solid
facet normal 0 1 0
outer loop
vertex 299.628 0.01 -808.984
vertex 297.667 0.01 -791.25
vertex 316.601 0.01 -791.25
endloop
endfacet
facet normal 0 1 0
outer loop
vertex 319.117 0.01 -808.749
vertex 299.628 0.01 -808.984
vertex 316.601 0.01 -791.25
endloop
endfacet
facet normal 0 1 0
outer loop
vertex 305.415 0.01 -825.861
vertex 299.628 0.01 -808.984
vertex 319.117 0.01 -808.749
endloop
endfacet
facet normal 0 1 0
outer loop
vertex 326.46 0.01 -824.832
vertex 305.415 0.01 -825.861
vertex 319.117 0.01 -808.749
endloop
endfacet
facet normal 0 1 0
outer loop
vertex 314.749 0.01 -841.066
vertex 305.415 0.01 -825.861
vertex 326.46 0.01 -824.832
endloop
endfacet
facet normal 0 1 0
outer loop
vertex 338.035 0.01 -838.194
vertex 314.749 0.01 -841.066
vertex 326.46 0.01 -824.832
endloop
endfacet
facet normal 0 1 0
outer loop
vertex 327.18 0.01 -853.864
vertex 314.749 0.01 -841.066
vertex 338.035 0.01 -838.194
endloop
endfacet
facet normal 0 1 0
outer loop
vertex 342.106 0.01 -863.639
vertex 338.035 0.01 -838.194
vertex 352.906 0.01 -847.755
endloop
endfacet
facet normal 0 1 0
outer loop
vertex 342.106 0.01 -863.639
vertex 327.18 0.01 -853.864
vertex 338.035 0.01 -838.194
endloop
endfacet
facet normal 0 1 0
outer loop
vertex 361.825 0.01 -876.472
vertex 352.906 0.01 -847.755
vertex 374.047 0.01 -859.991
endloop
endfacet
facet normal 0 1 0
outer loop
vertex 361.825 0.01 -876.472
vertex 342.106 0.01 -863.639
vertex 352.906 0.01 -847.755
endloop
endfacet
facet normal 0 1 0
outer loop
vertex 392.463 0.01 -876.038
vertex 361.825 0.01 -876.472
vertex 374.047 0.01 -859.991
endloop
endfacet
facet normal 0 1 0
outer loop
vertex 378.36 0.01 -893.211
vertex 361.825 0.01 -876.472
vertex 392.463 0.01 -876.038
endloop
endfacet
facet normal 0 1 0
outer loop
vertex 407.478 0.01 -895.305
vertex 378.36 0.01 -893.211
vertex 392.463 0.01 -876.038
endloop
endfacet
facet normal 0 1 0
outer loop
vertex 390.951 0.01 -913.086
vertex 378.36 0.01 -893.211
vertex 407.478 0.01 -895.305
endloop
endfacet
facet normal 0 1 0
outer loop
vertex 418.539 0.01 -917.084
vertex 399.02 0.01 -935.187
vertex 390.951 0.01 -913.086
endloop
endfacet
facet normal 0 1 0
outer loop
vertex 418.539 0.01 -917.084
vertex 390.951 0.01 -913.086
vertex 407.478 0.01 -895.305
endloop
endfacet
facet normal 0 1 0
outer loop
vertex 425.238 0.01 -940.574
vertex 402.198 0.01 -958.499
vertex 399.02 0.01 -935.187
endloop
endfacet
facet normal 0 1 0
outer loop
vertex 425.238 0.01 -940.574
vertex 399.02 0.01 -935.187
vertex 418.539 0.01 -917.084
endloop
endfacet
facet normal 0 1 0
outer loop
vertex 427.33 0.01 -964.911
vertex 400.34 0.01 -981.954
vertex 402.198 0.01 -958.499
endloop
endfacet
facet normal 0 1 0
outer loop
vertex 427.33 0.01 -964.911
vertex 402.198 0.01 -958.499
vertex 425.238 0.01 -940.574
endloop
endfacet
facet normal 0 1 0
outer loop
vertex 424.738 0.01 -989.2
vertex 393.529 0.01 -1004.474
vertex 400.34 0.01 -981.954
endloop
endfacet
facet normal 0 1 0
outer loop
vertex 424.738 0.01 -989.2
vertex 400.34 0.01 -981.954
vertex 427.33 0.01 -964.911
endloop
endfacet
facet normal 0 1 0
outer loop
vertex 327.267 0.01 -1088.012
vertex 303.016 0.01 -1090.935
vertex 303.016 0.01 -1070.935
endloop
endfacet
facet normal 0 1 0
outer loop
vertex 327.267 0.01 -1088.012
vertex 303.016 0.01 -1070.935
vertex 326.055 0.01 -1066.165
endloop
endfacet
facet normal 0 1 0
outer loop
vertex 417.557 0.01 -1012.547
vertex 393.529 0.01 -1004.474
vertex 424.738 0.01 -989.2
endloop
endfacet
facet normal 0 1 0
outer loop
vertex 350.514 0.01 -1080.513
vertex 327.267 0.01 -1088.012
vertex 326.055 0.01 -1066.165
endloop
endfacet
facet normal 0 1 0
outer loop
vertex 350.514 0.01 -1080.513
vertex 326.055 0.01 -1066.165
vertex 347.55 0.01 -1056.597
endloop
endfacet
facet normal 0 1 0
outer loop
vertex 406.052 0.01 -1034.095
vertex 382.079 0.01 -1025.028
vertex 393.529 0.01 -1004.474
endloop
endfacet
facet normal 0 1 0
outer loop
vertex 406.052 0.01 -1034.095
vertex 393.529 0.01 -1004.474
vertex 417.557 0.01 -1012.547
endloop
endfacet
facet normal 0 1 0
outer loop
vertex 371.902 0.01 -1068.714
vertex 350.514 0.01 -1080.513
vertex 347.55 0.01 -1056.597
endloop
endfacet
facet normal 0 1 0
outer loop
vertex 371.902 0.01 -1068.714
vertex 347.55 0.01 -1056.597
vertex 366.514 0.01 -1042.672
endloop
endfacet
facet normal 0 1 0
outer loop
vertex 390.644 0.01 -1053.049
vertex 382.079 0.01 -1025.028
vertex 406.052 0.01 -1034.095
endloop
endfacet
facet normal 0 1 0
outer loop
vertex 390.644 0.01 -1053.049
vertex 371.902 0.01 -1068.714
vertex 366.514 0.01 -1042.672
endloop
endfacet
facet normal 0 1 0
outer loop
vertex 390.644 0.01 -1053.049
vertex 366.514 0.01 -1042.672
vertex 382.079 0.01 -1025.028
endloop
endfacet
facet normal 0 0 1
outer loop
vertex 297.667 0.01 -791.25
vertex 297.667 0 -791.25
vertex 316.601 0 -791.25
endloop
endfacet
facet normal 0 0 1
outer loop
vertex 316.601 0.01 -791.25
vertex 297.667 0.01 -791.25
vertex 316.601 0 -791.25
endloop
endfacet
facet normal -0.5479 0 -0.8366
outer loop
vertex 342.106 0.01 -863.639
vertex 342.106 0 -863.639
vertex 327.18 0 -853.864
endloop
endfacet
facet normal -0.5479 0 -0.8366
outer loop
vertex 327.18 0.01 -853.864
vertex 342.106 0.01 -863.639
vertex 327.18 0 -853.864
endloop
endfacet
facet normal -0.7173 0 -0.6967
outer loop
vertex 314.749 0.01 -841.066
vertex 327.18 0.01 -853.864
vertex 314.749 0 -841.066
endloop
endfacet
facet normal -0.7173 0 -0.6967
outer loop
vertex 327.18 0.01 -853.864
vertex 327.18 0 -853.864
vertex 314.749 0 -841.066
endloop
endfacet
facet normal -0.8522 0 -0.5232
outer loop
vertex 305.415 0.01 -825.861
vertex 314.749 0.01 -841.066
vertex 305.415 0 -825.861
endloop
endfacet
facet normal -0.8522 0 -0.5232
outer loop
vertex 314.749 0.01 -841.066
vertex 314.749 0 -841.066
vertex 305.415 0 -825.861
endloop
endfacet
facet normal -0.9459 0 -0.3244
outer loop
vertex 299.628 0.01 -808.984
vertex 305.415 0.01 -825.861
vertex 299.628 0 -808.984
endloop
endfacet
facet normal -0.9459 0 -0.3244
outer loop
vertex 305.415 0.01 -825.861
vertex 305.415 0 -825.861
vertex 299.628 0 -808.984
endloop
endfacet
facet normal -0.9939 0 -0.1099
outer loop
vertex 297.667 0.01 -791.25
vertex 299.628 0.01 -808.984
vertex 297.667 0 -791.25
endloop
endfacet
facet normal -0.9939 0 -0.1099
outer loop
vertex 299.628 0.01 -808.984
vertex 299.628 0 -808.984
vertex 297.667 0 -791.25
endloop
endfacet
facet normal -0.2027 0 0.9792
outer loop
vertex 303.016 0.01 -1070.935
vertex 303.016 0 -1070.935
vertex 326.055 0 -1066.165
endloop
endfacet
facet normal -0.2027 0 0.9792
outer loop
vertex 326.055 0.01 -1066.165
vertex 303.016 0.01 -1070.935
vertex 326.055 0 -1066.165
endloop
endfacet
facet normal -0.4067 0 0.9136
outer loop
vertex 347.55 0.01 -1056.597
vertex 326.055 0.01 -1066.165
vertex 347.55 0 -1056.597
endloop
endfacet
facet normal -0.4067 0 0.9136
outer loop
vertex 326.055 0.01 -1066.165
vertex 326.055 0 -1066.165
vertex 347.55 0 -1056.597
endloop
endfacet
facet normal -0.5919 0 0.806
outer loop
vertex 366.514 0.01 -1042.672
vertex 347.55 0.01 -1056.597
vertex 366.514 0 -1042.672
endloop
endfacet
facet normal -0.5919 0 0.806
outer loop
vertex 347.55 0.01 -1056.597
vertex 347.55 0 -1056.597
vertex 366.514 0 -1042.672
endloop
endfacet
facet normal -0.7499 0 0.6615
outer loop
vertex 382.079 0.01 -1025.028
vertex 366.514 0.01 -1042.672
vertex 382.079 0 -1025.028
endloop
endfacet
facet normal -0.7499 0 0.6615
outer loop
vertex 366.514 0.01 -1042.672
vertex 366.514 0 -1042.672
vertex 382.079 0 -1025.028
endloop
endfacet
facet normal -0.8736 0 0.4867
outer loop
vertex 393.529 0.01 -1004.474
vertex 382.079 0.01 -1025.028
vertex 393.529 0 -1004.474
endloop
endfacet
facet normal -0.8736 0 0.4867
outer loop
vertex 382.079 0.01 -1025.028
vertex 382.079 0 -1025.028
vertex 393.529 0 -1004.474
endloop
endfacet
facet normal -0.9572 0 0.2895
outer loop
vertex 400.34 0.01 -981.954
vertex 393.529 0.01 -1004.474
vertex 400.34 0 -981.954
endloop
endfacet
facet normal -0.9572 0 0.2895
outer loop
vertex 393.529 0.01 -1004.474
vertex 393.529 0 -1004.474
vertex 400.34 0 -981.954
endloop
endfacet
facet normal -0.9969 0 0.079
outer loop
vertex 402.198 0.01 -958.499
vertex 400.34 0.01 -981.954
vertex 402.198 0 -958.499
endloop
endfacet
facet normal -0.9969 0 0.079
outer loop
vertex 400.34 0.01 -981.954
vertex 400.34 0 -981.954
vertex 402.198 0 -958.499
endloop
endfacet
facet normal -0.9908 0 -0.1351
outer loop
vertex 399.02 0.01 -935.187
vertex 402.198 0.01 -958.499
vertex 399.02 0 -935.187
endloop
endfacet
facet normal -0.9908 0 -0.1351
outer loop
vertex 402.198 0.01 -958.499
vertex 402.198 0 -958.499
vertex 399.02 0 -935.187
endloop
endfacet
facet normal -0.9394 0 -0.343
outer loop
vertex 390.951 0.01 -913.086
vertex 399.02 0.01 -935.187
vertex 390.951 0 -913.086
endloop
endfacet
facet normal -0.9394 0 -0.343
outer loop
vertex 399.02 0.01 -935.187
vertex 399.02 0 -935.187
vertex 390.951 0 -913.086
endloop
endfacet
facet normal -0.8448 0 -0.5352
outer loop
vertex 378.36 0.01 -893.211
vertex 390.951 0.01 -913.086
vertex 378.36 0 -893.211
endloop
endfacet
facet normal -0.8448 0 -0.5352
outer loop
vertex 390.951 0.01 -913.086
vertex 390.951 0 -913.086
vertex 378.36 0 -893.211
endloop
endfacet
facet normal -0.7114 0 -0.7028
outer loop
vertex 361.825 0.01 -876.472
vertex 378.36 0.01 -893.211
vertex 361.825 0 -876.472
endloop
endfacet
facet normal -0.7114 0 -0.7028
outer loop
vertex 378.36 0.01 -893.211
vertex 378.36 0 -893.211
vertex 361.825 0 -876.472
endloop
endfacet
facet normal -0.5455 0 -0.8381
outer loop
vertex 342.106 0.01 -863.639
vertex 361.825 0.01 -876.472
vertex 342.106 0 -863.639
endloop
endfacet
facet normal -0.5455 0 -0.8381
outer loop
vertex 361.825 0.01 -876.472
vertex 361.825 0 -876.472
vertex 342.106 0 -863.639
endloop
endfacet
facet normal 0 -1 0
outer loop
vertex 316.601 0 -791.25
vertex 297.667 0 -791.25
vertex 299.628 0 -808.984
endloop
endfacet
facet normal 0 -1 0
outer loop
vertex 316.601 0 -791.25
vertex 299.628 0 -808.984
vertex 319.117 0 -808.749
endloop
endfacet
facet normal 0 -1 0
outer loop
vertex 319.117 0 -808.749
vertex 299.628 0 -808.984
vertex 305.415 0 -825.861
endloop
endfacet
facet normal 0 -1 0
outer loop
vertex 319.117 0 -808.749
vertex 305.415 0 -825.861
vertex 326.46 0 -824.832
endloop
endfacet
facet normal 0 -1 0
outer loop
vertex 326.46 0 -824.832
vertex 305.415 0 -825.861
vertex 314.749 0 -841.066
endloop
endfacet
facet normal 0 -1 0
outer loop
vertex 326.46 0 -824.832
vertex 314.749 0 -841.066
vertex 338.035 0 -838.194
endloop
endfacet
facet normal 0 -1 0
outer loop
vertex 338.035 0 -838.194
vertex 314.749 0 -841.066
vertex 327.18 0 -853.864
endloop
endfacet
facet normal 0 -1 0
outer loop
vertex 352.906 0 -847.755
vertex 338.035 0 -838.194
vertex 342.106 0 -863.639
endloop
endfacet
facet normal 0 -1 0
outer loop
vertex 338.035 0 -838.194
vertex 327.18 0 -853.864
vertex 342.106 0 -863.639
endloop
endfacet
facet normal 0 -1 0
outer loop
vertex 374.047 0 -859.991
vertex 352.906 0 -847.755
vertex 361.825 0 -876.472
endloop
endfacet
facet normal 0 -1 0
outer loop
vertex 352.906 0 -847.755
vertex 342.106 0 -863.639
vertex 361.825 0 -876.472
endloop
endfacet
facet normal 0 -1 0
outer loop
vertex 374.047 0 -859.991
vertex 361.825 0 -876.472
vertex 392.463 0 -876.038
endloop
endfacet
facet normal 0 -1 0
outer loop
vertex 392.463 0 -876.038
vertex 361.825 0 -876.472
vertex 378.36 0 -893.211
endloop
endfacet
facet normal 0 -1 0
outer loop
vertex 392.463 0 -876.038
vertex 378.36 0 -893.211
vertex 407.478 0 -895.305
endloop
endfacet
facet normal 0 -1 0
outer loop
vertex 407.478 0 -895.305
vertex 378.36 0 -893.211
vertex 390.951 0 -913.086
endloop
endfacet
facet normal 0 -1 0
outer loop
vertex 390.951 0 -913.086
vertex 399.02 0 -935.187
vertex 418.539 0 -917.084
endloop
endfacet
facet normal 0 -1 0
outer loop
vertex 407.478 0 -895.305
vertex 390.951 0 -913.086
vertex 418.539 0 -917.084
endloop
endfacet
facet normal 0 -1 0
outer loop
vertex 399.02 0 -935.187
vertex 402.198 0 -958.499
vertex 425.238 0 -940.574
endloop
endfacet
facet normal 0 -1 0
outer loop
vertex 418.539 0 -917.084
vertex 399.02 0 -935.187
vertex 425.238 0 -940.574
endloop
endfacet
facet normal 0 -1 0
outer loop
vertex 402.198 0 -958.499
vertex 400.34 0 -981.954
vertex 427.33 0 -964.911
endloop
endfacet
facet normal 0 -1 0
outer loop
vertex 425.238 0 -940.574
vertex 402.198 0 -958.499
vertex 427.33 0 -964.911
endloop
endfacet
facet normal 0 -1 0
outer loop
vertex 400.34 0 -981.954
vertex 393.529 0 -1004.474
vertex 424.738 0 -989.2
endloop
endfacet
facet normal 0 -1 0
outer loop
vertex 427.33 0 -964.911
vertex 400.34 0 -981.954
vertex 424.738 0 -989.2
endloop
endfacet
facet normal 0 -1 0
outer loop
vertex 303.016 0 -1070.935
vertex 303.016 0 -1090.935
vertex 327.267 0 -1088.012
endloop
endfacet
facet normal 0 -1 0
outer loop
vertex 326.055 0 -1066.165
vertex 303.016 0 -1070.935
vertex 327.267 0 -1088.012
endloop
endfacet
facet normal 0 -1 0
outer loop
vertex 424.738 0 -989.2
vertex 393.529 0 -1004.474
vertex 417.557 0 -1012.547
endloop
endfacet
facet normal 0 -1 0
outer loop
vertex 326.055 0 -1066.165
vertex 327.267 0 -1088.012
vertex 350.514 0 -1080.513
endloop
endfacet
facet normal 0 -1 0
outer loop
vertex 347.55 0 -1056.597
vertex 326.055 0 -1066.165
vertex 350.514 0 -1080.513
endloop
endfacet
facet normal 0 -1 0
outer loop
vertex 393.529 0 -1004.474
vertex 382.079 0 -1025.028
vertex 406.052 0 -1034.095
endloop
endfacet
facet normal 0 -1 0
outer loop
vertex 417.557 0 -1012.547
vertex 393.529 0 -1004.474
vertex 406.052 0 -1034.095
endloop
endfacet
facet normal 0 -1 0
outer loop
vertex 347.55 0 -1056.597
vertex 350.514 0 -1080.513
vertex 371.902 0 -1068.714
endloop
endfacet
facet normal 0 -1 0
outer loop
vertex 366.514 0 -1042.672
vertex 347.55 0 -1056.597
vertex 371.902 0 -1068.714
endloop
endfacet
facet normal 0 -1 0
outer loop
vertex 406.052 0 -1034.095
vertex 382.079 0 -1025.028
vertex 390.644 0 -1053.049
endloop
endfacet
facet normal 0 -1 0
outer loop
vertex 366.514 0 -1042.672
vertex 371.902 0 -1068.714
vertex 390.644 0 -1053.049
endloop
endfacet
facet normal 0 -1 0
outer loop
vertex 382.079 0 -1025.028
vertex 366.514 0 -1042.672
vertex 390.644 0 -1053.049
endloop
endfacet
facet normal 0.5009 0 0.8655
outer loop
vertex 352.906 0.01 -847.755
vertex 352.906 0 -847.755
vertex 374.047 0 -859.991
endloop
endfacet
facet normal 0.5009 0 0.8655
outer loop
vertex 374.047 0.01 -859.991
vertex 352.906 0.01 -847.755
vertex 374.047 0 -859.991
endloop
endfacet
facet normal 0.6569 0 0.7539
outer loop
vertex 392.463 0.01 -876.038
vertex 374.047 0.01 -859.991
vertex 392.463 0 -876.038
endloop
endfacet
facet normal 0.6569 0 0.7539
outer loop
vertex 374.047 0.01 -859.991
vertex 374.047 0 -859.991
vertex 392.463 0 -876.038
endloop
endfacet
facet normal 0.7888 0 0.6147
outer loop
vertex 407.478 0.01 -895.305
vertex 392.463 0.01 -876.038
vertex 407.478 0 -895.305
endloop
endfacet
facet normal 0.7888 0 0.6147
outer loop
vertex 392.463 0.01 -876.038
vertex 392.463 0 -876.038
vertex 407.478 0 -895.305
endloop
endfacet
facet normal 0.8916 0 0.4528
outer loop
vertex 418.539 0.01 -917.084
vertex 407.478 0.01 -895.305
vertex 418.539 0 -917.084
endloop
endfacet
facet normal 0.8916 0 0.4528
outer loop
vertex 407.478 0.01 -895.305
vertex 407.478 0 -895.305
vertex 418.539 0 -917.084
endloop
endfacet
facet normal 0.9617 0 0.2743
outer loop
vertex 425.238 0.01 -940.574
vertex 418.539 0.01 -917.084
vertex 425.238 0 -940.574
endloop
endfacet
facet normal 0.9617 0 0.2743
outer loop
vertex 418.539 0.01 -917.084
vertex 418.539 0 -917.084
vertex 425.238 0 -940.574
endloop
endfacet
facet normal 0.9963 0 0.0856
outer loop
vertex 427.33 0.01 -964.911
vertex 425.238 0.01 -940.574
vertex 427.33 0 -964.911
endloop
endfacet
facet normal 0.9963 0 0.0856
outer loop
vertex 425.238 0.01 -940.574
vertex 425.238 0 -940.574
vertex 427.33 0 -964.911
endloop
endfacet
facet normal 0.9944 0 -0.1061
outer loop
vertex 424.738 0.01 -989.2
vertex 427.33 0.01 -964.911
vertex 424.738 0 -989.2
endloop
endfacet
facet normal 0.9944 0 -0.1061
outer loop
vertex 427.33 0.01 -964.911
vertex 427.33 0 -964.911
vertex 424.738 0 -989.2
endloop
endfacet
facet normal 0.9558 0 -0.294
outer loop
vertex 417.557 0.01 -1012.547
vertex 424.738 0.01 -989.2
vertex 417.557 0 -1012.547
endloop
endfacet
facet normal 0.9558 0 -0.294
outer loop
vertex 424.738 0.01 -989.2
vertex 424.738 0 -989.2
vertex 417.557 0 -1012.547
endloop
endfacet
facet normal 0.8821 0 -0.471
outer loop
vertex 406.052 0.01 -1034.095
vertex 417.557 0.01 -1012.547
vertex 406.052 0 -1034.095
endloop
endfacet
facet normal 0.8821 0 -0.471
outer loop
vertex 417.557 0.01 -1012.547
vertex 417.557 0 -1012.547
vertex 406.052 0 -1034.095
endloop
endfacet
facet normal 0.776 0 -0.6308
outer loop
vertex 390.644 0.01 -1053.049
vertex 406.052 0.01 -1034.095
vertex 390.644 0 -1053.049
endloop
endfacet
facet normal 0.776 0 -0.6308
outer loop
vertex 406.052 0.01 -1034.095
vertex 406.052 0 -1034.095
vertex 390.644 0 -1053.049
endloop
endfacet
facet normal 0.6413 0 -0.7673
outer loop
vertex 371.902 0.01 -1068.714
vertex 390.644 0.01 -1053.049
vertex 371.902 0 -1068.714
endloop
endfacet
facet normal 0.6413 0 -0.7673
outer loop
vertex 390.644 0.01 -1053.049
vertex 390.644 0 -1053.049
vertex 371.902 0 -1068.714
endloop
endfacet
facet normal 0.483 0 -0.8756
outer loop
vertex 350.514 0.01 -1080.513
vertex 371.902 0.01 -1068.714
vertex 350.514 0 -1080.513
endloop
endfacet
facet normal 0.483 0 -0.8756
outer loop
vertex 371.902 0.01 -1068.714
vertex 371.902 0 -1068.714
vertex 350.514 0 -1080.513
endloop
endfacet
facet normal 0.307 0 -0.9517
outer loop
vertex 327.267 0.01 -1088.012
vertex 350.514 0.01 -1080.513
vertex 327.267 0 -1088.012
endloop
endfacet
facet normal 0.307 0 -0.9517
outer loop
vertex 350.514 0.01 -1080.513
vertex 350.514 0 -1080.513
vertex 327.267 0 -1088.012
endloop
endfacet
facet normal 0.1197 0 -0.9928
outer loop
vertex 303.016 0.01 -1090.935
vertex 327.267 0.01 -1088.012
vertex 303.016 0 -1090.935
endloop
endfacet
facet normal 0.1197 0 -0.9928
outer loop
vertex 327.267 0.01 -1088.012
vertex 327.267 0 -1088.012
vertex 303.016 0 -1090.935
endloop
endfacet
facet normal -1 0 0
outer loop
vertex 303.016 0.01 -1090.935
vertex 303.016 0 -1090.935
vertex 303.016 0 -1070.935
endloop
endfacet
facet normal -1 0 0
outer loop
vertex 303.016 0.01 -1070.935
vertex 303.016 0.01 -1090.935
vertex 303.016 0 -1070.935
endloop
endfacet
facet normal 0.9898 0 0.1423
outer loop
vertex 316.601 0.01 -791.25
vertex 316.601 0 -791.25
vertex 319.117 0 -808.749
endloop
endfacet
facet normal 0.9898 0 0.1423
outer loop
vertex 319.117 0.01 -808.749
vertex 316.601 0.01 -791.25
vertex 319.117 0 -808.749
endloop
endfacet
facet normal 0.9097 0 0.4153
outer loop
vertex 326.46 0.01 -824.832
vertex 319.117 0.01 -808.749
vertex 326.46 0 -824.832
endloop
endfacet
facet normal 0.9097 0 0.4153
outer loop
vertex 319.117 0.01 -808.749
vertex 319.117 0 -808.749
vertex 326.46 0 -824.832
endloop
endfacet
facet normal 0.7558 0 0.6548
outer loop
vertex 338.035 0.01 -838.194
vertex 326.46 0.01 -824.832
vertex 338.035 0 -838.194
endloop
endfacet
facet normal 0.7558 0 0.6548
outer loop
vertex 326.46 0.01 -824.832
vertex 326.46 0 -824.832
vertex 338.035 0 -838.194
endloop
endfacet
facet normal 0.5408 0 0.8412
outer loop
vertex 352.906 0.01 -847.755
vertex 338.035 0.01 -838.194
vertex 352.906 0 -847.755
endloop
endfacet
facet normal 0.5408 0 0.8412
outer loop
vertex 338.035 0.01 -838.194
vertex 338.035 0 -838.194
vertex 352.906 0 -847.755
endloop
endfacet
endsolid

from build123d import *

# Parameters (mm, degrees)
RESSALTO_EXTRUS_O10_DEPTH = 0.01


with BuildPart() as part:
    # Esboço1 → Ressalto-extrusão10 (new body)
    with BuildSketch(Plane(origin=(0, 0, 0), x_dir=(1, 0, 0), z_dir=(0, 1, 0))):
        with BuildLine():
            Line((297.666961951, 791.249979553), (316.601353193, 791.249979553))
            ThreePointArc((316.601353193, 791.249979553), (326.459664642, 824.831536178), (352.905895622, 847.755412747))
            ThreePointArc((352.905895622, 847.755412747), (424.73842096, 989.200052783), (303.015592938, 1090.935253327))
            Line((303.015592938, 1090.935253327), (303.015592938, 1070.935253327))
            ThreePointArc((303.015592938, 1070.935253327), (400.339583638, 981.95381865), (342.105865492, 863.638608496))
            ThreePointArc((342.105865492, 863.638608496), (309.663048344, 833.720350837), (297.666961951, 791.249979553))
        make_face()
    extrude(amount=RESSALTO_EXTRUS_O10_DEPTH)


solid = part.part
